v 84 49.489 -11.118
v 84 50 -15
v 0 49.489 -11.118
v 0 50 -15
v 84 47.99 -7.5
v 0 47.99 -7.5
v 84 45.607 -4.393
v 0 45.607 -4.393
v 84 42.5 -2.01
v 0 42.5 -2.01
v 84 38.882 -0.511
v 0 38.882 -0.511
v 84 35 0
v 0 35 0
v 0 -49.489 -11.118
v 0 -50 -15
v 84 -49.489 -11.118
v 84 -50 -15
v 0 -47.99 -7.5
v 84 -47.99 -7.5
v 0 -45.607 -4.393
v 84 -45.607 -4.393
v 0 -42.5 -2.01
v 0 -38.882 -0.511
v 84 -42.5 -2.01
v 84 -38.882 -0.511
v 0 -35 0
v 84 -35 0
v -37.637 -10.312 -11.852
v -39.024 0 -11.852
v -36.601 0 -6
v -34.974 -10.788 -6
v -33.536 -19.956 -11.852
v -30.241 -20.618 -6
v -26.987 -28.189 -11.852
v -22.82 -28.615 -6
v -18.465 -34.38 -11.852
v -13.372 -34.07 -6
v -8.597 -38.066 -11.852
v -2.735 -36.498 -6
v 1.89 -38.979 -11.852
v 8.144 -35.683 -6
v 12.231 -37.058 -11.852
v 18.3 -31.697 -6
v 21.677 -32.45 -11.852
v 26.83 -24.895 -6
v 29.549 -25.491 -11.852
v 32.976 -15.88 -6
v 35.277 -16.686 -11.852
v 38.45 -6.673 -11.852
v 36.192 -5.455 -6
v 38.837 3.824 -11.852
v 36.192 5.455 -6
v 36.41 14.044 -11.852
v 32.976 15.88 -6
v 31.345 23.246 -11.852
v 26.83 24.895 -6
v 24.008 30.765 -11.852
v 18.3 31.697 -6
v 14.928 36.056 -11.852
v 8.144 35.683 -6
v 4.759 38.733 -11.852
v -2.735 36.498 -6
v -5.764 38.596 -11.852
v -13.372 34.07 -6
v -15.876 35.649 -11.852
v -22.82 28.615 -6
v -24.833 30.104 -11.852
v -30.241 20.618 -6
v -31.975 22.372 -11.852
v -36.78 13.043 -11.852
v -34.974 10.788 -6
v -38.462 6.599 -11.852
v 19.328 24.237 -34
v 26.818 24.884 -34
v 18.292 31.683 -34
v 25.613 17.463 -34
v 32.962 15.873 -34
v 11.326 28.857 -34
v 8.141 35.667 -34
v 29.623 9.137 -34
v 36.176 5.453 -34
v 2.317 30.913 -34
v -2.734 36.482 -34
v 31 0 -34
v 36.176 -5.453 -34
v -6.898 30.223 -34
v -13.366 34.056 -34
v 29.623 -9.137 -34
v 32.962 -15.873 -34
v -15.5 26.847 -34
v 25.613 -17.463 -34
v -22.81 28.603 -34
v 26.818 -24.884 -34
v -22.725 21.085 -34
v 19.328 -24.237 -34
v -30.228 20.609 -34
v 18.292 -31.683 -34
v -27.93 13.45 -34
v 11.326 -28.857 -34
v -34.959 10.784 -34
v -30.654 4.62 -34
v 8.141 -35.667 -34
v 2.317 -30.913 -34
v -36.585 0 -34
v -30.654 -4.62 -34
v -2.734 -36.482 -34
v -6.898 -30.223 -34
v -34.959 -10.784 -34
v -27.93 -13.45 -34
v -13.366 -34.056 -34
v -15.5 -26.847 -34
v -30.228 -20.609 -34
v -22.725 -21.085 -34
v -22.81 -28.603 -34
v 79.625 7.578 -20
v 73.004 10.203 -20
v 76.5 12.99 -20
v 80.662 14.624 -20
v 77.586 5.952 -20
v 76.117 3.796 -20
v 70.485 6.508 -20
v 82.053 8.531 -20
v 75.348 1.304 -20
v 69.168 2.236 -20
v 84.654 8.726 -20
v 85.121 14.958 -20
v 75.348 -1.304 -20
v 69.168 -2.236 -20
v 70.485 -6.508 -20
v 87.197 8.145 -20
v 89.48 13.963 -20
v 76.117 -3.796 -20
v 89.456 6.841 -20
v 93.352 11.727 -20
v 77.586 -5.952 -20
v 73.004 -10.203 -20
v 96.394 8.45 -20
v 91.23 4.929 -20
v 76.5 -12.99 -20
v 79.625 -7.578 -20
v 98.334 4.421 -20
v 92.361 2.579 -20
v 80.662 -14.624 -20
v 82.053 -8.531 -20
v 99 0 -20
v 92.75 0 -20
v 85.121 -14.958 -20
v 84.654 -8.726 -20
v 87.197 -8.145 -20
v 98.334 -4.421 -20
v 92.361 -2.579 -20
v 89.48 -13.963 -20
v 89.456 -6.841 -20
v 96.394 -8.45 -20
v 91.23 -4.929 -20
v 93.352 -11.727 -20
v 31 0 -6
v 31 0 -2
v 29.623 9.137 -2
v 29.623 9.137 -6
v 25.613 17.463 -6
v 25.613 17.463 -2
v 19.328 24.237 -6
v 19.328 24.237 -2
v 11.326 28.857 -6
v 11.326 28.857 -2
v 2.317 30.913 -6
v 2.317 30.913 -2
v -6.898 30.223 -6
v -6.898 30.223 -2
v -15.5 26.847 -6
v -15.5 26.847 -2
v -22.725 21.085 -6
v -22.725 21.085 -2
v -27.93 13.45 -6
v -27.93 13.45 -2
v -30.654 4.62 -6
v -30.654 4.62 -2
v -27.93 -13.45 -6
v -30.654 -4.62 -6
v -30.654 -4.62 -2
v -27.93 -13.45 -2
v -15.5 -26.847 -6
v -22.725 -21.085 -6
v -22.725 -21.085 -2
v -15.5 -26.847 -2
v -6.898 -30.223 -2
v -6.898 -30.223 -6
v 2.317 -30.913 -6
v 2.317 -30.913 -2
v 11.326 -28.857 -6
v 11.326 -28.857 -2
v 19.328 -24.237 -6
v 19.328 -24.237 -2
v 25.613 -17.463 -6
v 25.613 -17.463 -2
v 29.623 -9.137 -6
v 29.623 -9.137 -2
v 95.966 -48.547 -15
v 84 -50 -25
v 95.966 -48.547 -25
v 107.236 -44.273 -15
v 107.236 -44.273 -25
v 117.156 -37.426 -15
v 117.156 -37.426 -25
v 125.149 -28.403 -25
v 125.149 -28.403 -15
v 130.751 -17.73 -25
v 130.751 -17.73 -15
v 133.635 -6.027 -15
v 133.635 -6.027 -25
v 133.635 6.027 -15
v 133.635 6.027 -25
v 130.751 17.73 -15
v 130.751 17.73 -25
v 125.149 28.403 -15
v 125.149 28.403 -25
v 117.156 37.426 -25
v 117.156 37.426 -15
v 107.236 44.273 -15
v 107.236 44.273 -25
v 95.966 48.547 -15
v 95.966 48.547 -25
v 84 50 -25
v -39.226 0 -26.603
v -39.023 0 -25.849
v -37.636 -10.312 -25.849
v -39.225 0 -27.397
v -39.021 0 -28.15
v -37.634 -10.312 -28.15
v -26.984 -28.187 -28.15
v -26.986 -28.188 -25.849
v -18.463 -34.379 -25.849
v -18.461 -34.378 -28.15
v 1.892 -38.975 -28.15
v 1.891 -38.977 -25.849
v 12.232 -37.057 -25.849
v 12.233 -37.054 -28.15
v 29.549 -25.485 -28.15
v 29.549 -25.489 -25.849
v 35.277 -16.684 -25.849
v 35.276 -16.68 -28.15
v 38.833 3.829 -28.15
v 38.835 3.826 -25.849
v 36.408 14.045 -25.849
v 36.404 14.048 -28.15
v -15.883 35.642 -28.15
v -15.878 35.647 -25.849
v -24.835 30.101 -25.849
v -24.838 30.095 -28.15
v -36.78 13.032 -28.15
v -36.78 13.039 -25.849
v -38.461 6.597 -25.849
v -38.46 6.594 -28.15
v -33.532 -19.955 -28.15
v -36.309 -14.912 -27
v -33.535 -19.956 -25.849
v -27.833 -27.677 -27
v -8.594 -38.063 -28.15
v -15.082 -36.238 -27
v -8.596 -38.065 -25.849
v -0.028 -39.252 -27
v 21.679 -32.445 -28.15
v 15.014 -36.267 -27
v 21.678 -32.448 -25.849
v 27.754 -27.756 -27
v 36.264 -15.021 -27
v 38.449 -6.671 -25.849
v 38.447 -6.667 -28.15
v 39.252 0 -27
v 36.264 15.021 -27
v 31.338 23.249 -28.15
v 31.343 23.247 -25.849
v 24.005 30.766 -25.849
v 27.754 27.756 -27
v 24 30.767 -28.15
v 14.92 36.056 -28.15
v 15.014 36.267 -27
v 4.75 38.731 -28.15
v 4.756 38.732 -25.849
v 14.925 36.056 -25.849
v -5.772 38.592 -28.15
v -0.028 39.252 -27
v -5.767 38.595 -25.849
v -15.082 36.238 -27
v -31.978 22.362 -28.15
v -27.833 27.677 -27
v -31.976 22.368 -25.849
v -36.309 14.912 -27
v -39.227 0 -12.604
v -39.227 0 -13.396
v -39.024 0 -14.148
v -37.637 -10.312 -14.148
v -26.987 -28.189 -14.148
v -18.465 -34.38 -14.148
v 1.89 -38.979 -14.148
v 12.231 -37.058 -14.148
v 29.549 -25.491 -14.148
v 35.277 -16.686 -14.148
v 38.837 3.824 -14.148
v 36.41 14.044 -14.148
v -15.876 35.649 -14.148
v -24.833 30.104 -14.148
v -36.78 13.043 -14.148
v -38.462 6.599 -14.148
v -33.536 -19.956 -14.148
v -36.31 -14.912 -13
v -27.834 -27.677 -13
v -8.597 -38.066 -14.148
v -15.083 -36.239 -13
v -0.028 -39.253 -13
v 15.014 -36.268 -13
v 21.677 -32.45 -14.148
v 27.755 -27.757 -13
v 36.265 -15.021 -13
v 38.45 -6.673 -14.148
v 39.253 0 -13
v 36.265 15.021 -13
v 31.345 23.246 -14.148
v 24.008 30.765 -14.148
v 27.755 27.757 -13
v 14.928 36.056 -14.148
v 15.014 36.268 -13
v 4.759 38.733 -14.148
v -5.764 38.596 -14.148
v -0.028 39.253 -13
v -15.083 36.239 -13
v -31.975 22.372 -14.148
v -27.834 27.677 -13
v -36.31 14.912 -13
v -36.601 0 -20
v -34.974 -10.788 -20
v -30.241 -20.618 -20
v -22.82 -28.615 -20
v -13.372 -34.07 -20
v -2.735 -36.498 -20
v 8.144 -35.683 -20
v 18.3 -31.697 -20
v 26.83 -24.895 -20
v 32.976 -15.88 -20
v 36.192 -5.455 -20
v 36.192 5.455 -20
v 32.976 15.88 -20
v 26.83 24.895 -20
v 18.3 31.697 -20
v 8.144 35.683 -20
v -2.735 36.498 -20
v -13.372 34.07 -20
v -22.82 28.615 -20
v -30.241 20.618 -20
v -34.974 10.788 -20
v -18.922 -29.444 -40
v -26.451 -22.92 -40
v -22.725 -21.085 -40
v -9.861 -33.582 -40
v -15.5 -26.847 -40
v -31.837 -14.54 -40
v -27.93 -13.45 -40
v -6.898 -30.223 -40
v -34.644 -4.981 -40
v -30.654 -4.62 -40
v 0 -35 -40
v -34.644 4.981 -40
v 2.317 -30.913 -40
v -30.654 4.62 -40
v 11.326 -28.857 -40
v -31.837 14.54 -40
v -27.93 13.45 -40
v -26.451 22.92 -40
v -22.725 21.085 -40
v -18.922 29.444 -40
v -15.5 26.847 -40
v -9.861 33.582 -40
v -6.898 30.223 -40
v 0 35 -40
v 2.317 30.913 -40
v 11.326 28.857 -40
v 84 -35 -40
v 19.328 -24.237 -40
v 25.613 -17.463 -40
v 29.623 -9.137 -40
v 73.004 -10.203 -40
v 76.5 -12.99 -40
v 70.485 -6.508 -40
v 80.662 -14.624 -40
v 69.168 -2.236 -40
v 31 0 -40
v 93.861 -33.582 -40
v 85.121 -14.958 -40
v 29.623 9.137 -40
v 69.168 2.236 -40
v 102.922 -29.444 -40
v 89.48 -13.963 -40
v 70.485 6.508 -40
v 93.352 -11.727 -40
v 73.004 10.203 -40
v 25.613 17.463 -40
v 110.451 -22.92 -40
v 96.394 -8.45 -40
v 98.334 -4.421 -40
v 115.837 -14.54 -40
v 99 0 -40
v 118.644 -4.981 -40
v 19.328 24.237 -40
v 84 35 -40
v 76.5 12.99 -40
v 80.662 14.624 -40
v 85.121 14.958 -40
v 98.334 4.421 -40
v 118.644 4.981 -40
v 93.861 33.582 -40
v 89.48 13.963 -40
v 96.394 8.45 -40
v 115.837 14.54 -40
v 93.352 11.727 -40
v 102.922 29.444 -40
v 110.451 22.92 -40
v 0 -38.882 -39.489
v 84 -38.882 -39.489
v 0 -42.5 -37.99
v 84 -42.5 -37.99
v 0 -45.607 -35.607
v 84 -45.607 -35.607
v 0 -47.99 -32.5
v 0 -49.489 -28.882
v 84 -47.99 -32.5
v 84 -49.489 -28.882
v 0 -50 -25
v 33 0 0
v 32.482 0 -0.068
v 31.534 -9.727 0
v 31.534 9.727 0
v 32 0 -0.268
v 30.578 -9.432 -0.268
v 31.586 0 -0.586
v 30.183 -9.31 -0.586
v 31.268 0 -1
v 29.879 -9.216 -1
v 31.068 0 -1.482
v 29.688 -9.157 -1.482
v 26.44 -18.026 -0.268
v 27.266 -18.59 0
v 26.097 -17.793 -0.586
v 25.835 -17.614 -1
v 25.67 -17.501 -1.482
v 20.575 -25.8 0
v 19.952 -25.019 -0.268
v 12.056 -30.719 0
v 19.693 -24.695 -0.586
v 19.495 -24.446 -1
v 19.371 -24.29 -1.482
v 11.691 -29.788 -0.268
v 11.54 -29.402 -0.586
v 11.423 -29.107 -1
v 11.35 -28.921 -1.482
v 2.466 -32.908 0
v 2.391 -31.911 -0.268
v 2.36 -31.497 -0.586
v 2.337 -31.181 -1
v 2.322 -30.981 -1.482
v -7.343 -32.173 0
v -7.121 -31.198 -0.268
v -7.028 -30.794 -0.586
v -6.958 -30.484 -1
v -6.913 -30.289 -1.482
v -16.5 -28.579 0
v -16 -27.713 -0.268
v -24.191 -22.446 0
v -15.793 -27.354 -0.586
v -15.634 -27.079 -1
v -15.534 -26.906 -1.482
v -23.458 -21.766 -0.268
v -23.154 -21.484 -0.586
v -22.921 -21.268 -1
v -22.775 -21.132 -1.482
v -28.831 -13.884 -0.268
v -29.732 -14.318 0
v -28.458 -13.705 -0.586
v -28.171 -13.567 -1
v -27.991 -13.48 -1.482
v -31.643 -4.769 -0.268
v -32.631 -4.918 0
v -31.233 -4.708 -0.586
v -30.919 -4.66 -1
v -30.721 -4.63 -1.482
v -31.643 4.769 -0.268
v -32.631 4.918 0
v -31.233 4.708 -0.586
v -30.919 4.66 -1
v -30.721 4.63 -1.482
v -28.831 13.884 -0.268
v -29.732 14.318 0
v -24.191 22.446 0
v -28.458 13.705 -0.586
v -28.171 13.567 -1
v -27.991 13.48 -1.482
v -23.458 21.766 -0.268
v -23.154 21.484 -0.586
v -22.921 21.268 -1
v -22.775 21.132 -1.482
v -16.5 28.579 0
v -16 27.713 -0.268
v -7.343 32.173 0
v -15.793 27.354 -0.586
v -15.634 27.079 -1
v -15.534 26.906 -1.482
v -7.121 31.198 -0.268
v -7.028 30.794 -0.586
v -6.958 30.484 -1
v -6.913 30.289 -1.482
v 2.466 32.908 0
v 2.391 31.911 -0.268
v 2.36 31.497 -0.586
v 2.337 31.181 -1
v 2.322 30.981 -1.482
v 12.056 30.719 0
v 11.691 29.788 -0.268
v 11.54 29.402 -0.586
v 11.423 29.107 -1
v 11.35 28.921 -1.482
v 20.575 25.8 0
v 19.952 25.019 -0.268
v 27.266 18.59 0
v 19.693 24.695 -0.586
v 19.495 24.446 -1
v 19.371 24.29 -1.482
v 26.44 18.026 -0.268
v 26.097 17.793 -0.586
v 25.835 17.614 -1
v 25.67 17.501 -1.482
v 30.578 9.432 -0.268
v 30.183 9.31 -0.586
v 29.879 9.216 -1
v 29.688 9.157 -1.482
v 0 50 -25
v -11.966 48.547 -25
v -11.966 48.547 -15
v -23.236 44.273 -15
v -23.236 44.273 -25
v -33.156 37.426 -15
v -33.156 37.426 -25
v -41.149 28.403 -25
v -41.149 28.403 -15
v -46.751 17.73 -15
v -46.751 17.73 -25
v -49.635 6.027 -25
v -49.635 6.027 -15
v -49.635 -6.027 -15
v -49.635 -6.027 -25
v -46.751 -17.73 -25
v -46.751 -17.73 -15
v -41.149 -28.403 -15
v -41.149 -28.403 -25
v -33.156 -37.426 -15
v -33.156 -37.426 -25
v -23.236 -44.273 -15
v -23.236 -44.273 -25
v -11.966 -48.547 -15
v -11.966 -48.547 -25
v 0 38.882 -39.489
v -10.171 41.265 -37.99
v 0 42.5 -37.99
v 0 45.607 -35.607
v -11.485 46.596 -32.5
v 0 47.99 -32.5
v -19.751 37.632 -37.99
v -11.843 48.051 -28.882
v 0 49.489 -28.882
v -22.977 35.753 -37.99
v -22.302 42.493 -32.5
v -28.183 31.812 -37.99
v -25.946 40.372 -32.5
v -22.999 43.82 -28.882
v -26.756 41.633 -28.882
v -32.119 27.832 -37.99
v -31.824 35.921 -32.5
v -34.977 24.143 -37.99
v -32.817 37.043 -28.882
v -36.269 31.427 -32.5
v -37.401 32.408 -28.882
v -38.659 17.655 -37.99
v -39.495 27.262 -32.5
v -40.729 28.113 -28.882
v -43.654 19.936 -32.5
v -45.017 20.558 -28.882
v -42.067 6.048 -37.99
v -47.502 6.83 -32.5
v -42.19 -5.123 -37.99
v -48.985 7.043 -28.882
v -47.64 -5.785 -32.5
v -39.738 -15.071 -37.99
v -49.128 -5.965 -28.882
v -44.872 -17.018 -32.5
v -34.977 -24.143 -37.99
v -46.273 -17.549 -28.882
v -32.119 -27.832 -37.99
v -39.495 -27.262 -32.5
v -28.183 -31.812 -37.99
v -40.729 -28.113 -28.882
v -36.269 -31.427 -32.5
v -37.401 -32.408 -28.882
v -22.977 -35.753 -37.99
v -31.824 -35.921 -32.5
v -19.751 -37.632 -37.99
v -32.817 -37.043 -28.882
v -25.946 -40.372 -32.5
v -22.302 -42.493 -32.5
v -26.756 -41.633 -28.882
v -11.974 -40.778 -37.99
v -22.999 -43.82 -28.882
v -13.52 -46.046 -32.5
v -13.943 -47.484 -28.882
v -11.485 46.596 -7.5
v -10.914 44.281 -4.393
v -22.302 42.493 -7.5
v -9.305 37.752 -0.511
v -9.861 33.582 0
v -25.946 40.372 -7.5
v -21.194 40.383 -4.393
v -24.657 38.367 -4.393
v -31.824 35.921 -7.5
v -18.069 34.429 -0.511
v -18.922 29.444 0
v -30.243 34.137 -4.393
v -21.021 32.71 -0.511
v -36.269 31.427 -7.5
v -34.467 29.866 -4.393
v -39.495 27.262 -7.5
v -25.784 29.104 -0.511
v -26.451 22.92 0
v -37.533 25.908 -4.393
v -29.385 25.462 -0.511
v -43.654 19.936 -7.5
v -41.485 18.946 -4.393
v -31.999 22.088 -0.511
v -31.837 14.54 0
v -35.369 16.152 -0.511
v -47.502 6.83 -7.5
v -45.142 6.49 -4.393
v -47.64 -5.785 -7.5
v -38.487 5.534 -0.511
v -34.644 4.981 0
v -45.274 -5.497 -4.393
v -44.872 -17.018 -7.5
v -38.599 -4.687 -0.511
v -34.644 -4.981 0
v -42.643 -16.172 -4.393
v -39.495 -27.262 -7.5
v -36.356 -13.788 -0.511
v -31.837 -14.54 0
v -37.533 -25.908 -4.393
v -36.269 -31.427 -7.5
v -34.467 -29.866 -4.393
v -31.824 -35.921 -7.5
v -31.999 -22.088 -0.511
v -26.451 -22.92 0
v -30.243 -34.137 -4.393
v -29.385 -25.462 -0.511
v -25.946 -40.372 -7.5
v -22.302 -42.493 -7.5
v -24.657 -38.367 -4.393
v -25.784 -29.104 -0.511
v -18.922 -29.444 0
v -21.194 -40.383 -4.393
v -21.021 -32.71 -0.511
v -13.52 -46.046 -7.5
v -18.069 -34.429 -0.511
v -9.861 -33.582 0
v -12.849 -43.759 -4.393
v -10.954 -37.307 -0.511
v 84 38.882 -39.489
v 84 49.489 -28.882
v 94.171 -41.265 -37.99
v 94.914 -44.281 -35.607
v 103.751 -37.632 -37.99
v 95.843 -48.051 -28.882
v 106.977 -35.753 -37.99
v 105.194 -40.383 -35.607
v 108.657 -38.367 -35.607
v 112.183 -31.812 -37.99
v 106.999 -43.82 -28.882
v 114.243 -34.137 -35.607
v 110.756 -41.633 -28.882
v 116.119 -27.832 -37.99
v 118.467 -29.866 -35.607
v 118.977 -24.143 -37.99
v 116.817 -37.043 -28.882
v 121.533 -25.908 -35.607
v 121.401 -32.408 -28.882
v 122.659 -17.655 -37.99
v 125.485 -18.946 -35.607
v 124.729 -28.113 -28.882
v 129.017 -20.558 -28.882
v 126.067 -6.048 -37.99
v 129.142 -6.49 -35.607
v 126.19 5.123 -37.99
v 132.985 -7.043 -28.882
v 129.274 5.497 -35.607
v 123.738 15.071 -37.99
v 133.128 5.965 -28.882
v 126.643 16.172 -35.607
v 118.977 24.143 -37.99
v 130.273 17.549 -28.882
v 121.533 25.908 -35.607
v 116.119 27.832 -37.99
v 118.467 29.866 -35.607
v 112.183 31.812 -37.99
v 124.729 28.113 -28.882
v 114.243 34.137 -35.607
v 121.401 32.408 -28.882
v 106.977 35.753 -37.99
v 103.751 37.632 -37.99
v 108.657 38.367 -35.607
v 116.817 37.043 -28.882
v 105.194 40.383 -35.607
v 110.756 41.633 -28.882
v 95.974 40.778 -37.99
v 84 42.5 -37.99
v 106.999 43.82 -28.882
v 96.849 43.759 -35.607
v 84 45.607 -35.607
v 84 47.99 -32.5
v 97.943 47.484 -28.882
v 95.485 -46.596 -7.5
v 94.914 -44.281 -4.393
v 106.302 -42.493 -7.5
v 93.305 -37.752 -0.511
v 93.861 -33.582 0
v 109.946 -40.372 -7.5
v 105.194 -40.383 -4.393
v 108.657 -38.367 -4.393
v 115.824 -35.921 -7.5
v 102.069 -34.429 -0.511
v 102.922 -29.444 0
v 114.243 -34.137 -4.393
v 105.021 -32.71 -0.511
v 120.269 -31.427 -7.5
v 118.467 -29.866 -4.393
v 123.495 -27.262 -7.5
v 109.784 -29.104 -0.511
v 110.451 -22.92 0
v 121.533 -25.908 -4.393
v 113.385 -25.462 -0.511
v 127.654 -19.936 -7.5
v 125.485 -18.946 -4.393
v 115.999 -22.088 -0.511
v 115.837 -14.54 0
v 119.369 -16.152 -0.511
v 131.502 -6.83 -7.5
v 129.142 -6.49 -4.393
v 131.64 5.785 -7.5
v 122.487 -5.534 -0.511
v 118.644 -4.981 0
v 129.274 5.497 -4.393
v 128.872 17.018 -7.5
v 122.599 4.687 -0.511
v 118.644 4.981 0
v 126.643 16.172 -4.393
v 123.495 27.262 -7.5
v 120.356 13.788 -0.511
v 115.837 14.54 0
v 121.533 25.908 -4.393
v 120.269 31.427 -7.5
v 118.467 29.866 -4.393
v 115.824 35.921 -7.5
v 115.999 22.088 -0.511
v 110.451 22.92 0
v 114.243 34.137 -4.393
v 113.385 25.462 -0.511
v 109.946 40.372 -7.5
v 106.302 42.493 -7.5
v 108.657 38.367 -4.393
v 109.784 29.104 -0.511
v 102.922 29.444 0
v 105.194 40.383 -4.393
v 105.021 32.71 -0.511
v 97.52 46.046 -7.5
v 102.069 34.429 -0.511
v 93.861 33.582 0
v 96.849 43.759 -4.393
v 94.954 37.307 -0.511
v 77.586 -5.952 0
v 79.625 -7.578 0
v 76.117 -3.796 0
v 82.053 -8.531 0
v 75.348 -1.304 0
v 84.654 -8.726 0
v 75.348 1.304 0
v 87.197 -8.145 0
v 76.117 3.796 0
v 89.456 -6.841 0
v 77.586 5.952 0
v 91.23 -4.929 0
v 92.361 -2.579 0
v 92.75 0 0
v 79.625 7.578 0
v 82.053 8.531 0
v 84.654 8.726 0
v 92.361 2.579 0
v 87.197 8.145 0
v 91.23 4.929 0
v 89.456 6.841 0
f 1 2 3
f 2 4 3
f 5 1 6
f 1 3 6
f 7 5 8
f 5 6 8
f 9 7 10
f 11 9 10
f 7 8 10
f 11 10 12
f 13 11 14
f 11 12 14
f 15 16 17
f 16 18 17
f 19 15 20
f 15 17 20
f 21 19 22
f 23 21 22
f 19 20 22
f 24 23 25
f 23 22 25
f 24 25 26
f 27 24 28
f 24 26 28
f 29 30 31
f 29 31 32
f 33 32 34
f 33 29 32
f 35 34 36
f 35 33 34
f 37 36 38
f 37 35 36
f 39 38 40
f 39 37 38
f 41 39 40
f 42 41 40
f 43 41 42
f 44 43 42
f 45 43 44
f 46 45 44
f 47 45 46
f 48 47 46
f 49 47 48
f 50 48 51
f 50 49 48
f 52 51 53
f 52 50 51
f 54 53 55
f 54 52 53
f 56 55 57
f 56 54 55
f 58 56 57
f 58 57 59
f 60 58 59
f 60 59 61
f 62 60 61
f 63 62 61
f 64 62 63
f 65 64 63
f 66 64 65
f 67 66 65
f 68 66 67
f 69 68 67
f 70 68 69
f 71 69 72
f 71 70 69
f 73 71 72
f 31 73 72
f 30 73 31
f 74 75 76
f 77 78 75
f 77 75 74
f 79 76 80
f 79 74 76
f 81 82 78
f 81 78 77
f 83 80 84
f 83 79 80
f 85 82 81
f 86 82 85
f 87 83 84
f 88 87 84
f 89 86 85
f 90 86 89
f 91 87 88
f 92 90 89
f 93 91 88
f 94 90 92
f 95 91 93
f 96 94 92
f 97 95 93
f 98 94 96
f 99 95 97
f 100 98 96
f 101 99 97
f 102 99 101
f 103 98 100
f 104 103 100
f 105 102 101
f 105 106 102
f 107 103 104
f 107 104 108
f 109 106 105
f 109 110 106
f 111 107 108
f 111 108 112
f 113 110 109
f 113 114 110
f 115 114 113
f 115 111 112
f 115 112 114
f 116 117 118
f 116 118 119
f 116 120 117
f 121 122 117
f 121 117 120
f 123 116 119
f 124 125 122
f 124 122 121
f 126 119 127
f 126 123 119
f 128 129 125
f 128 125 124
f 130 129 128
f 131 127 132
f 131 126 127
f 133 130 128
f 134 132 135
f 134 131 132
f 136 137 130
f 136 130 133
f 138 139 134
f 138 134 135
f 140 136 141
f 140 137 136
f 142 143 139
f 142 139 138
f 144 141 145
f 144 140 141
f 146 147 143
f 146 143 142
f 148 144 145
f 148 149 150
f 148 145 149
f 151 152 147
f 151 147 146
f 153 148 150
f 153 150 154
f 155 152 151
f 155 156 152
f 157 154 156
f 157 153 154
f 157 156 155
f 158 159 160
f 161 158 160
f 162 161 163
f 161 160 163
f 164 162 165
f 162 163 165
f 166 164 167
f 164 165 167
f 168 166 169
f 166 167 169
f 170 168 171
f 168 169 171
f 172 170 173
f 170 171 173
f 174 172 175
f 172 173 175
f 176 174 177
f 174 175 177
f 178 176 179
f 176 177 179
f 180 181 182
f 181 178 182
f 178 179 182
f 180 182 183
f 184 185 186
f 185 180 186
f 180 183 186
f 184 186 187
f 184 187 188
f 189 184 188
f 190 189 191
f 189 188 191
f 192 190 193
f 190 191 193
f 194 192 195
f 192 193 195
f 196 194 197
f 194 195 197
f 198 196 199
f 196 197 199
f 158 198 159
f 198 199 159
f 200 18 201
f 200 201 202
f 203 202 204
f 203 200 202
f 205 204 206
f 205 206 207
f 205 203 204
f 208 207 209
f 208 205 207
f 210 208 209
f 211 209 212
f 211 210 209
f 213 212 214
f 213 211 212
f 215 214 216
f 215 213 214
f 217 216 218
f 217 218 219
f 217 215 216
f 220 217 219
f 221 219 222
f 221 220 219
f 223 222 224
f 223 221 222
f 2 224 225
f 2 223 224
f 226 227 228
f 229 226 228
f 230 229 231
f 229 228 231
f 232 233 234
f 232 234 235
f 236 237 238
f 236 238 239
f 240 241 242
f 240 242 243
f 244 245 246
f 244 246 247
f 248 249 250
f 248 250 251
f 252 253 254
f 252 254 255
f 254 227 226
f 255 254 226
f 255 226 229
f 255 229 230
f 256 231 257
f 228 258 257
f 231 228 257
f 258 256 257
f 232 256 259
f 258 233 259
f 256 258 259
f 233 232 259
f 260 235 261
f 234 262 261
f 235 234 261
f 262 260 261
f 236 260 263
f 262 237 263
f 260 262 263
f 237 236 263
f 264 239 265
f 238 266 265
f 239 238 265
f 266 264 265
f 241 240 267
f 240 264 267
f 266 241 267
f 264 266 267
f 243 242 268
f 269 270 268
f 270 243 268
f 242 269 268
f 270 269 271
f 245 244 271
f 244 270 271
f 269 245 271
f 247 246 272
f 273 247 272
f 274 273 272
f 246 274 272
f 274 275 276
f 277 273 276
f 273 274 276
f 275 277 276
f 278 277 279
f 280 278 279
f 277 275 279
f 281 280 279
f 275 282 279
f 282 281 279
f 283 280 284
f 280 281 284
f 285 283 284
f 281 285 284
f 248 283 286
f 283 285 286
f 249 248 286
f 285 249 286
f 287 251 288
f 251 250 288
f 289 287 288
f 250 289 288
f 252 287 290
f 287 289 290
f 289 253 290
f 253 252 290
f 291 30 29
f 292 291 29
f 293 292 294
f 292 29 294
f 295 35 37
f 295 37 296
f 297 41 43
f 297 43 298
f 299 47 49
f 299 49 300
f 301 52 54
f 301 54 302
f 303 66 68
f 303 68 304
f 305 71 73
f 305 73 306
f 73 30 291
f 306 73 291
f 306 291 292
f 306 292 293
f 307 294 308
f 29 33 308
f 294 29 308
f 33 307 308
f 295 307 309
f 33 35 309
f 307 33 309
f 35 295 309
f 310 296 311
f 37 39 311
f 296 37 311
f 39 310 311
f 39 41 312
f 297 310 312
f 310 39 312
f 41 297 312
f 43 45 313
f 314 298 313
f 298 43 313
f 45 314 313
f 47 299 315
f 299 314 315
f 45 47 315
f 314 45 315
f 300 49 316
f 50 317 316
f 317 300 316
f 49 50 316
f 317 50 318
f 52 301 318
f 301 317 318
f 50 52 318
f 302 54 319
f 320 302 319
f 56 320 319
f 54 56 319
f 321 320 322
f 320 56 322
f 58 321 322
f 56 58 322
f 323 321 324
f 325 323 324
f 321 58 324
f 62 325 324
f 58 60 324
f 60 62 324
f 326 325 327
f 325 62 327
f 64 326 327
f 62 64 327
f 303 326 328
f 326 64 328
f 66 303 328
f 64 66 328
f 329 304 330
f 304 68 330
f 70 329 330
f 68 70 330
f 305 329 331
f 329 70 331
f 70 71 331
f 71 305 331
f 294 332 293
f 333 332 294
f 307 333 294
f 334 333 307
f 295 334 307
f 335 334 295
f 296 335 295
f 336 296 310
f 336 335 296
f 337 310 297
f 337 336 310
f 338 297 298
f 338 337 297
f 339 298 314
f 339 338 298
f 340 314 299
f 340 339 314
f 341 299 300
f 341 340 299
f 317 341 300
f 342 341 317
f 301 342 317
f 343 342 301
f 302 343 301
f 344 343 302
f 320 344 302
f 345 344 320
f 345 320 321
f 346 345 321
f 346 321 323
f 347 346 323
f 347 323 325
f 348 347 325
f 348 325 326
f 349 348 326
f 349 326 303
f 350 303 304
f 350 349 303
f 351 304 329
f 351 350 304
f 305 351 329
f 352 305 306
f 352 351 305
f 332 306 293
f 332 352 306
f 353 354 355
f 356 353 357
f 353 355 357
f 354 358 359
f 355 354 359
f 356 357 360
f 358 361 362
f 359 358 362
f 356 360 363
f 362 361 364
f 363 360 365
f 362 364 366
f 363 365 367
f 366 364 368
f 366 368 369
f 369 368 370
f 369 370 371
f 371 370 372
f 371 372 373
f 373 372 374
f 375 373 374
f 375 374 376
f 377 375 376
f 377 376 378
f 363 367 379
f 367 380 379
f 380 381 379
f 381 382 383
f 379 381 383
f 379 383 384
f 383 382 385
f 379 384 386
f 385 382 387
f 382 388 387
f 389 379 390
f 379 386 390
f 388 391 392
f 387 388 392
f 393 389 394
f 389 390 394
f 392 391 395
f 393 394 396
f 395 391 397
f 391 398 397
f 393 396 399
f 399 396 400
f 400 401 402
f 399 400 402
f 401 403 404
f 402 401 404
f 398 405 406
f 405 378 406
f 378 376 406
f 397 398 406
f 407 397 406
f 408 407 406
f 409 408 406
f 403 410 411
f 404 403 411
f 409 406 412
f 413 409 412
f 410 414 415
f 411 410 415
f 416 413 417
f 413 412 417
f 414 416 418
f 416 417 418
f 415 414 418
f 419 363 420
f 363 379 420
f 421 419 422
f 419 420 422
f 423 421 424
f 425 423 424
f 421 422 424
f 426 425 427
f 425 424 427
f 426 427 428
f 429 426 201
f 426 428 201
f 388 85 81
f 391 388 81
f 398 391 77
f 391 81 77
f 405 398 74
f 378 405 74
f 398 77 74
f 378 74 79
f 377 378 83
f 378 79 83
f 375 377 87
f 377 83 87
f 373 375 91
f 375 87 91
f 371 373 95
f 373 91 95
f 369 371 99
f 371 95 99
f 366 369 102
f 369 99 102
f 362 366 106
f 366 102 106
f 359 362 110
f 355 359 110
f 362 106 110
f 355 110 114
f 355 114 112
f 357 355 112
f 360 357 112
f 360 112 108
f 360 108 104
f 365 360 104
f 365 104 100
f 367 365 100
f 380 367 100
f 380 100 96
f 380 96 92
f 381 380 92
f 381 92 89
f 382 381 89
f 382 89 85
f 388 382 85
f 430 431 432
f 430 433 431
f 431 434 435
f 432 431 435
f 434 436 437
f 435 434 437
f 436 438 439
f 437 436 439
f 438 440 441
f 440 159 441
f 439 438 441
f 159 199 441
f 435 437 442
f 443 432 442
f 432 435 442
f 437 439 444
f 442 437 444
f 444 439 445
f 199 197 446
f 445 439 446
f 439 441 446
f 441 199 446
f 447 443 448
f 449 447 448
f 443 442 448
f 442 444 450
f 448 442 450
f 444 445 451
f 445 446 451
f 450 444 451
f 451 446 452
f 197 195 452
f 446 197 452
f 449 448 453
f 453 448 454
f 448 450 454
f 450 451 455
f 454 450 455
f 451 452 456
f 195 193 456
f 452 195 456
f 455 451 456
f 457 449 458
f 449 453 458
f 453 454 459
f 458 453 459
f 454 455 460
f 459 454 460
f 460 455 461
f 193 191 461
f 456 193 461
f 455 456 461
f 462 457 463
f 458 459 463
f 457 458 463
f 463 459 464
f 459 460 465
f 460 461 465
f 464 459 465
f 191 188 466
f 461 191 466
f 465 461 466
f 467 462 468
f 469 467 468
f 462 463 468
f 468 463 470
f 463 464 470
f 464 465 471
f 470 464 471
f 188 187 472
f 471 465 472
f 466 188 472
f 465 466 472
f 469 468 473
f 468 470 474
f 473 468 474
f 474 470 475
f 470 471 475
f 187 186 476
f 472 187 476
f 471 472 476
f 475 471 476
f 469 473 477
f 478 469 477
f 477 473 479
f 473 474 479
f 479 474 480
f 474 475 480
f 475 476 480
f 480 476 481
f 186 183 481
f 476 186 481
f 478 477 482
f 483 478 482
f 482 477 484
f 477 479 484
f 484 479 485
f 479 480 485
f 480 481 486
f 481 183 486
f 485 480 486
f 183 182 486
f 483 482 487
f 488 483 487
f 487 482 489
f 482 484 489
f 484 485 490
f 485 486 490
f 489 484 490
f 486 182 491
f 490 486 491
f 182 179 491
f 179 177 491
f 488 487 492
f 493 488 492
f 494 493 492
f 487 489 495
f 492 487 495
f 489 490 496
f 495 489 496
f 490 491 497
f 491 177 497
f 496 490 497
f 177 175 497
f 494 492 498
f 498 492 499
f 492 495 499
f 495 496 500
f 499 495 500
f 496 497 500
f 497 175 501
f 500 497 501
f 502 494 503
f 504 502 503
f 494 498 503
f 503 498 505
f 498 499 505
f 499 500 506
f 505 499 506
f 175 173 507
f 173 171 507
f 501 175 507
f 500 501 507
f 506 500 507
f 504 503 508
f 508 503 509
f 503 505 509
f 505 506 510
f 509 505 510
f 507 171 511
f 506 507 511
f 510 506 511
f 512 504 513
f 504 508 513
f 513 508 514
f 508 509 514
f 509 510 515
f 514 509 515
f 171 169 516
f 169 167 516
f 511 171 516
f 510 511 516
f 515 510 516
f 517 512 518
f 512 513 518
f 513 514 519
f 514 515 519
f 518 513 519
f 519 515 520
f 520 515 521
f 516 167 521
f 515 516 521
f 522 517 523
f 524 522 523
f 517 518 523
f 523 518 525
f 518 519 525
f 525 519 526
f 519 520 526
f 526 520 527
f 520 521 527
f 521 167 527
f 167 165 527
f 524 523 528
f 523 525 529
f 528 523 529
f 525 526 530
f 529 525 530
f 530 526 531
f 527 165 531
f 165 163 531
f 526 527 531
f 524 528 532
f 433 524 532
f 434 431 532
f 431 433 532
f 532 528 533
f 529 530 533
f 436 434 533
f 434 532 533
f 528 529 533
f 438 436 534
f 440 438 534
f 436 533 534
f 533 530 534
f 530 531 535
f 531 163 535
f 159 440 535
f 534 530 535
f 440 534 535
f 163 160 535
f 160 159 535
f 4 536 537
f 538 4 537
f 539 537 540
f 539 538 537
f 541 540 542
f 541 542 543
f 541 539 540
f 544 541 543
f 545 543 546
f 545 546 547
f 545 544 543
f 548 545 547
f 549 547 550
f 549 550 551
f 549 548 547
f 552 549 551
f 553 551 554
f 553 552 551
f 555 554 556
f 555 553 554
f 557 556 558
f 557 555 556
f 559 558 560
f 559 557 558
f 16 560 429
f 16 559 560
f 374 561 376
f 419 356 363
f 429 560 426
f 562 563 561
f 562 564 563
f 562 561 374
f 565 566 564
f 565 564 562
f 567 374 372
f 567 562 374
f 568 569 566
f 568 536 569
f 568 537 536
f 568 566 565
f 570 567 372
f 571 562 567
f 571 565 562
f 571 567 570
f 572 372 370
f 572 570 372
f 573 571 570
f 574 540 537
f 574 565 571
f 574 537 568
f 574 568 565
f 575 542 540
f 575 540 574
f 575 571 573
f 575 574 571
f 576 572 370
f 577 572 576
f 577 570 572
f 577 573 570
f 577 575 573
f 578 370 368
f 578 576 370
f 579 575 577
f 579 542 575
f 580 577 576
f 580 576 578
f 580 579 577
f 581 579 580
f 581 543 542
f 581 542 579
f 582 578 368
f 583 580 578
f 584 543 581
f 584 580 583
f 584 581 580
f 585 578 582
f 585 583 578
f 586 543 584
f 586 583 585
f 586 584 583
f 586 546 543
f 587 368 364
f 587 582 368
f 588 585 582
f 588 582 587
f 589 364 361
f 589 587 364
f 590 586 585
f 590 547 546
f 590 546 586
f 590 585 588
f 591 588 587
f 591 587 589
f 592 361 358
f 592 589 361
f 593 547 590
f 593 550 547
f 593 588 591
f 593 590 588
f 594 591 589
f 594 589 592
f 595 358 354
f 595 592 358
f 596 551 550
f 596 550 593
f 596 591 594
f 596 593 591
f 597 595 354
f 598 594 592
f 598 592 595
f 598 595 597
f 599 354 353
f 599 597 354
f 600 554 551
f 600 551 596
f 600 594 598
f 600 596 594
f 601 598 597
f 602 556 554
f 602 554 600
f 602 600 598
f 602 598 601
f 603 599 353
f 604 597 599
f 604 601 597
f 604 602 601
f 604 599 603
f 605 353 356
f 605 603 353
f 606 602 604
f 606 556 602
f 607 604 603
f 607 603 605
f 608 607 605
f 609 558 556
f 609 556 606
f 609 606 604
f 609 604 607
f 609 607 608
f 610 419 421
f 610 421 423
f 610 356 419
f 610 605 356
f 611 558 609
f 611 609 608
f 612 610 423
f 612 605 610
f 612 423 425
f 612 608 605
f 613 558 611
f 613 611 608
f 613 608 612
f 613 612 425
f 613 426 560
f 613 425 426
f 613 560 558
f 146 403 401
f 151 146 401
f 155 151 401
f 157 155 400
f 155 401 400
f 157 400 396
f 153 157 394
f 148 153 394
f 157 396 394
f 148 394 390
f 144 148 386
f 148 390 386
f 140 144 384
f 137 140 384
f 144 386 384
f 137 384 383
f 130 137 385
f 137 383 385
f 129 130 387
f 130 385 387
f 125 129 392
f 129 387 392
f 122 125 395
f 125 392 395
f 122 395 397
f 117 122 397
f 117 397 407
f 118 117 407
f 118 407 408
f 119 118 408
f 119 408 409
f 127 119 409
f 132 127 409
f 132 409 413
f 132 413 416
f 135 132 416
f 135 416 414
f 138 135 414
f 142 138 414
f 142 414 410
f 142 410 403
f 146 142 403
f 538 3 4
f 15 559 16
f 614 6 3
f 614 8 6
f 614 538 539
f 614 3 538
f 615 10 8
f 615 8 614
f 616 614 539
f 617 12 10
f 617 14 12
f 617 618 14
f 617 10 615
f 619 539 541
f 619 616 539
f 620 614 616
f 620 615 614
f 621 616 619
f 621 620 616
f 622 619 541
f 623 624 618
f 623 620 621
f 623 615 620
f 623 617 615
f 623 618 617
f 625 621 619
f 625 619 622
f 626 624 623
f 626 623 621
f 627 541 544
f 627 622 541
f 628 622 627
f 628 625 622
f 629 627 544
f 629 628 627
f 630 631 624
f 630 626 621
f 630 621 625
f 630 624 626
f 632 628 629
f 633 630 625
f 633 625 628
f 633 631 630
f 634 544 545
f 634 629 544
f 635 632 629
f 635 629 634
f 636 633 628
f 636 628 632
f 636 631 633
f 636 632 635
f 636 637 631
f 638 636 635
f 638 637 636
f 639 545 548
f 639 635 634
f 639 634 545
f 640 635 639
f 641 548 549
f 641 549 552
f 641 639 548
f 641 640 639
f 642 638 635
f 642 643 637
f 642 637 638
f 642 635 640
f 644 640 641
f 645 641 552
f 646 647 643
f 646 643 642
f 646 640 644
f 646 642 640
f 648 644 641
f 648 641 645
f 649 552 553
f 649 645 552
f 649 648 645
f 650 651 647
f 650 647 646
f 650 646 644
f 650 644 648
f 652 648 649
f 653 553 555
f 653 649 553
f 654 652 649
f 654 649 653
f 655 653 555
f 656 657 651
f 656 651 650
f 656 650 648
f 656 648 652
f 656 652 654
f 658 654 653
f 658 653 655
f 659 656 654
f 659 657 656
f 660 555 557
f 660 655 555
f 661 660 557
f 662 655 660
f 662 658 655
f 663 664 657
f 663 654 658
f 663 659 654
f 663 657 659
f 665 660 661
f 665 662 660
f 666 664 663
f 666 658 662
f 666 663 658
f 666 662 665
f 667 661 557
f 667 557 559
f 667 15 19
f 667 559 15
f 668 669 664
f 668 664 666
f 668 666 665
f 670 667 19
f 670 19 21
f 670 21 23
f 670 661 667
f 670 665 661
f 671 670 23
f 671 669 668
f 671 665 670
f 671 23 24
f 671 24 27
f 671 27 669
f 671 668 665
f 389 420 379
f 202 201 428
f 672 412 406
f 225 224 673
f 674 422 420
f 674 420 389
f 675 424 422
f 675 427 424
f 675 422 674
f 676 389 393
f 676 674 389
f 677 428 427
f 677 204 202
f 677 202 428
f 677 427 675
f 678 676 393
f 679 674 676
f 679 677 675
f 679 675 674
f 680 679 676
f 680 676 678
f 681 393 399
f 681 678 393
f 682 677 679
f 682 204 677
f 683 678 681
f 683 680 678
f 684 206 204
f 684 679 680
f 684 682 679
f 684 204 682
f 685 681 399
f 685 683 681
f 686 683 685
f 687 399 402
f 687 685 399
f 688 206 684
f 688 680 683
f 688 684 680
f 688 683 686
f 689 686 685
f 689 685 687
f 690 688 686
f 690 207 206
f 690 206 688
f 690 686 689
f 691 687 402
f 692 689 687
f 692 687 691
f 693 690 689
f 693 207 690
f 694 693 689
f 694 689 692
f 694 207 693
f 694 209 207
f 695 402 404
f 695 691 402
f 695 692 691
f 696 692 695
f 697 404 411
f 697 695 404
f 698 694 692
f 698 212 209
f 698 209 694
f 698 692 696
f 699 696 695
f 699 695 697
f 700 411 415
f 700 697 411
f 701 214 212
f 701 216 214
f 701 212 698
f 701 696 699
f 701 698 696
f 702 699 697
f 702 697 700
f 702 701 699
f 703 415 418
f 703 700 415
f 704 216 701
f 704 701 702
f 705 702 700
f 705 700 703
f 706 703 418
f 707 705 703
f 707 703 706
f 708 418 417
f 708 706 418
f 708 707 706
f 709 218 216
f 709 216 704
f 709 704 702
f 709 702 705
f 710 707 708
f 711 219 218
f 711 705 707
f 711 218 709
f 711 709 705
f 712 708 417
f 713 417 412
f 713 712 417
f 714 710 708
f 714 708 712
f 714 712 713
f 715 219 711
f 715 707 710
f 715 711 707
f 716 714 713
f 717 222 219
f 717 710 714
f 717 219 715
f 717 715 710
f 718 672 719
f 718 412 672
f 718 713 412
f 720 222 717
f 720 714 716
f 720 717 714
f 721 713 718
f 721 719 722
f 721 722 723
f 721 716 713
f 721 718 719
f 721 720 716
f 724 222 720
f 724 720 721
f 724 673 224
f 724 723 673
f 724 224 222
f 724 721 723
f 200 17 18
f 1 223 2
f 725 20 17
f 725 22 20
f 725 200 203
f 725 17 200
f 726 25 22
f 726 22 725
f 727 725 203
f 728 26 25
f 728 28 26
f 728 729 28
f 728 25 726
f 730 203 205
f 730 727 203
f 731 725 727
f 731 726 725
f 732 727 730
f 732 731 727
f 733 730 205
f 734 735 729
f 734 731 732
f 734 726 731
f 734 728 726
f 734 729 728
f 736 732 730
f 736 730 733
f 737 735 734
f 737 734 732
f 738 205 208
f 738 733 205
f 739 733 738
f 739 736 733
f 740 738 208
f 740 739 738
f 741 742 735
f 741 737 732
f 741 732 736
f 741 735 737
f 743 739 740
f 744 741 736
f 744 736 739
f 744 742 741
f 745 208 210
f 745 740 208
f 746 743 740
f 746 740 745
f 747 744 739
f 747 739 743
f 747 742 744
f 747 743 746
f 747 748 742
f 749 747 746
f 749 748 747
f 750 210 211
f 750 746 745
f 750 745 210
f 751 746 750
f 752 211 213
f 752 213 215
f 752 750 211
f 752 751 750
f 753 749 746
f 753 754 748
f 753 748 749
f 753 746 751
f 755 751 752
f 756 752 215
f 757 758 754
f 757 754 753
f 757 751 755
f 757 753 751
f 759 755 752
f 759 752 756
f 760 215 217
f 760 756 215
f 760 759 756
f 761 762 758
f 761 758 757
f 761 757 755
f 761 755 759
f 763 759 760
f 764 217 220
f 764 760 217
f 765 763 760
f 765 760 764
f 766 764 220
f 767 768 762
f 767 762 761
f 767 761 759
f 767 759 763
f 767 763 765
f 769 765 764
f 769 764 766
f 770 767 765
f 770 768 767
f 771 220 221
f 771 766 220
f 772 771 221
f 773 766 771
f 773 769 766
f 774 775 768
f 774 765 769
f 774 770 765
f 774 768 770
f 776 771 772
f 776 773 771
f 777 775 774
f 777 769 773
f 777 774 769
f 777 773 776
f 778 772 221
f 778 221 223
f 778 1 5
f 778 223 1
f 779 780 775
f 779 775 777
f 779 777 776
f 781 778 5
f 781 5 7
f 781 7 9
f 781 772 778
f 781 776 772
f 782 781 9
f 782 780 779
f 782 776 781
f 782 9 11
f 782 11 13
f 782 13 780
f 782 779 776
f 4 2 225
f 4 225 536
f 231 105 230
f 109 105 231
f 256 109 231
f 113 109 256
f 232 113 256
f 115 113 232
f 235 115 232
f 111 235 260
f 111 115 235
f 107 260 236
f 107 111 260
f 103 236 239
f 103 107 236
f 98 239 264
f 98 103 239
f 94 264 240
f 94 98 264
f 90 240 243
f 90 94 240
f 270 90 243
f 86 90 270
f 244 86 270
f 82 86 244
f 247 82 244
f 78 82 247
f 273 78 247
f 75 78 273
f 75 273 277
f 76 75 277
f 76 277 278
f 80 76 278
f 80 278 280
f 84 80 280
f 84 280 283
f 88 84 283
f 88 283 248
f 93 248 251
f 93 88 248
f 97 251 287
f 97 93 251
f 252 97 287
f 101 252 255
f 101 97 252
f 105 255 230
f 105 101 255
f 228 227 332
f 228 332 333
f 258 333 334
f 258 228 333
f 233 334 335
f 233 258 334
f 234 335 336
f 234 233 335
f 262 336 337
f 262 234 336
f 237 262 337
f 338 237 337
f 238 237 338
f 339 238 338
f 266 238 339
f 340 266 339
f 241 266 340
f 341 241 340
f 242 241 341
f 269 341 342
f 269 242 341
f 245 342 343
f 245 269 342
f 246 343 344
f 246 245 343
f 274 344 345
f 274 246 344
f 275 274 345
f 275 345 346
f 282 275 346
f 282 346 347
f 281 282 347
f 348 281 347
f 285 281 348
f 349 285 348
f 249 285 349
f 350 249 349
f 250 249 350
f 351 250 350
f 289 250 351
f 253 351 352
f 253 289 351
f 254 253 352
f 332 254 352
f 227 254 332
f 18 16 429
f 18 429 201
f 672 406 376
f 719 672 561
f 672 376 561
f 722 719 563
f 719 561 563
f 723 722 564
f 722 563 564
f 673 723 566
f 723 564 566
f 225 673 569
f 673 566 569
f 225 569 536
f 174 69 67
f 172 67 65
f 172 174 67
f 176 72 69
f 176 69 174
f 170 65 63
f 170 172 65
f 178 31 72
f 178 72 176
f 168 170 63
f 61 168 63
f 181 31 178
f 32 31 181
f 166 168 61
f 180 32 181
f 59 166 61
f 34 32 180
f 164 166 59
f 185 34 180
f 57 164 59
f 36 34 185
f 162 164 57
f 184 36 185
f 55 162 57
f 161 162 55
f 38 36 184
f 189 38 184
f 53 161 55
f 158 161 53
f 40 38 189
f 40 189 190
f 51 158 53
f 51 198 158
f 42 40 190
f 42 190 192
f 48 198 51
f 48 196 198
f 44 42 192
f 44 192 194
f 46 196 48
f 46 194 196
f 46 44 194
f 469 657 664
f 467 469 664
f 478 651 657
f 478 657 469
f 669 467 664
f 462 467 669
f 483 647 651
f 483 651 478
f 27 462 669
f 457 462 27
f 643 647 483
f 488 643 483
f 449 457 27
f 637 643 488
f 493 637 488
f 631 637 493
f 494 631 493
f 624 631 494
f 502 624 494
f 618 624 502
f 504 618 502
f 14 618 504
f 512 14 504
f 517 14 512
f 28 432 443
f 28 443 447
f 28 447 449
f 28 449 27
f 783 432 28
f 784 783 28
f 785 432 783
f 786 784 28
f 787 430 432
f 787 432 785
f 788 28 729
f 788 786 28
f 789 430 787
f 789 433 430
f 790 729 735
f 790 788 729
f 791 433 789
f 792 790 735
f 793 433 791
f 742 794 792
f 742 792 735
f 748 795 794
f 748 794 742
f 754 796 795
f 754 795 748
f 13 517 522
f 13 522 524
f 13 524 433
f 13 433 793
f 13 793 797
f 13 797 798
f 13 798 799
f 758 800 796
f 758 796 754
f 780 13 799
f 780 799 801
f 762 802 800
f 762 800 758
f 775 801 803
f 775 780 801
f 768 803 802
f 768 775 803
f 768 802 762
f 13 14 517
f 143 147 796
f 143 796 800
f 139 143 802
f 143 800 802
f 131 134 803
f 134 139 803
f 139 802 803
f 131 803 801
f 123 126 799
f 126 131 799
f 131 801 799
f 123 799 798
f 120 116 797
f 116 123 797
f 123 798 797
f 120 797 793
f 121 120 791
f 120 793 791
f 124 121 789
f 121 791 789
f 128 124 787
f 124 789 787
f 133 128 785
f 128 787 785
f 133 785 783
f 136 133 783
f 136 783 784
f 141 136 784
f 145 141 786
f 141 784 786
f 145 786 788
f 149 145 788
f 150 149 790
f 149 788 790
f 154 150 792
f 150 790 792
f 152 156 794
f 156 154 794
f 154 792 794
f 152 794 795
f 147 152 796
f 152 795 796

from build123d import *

# Parameters (mm, degrees)
F0_R           = 31
F0_R_2         = 8.75
F2_DEPTH       = 40
F4_D           = 17.5
F4_DEPTH       = 50
F4_CBORE_D     = 30
F4_CBORE_DEPTH = 20
F6_R           = 3
F8_R           = 15
F9_R           = 2


with BuildPart() as f2:
    # F0 (on Top) → F2 (new body)
    with BuildSketch(Plane.XY):
        with BuildLine():
            Line((84, 50), (0, 50))
            ThreePointArc((0, 50), (-50, 0), (0, -50))
            Line((0, -50), (84, -50))
            ThreePointArc((84, -50), (134, 0), (84, 50))
        make_face()
        Circle(F0_R, mode=Mode.SUBTRACT)
        with Locations((84, 0)):
            Circle(F0_R_2, mode=Mode.SUBTRACT)
    extrude(amount=-F2_DEPTH)

    # F4
    with Locations(Plane(origin=(0, 0, -40), x_dir=(1, 0, 0), z_dir=(0, 0, -1))):
        with Locations((84, 0)):
            CounterBoreHole(F4_D / 2, F4_CBORE_D / 2, F4_CBORE_DEPTH, depth=F4_DEPTH)


with BuildPart() as f5:
    # F1 (on Front) → F5 (revolve)
    with BuildSketch(Plane.XZ):
        Polygon((0, 0), (-31, 0), (-31, -6), (-36.600505, -6), (-39.5, -13), (-36.600505, -20), (-39.5, -27), (-36.58464, -33.999979), (-31, -33.999979), (-31, -40), (0, -40), align=None)
    revolve(axis=Axis((0, 0, -20), (0, 0, 1)))

    # F6
    f6_edges = [f5.edges().sort_by_distance(p)[0] for p in [
        (39.5, 0, -27),
        (39.5, 0, -13),
    ]]
    fillet(f6_edges, radius=F6_R)


with BuildPart() as f2_1:
    add(f2.part)

    # F7: cut F5
    add(f5.part, mode=Mode.SUBTRACT)

    # F8
    f8_edges = [f2_1.edges().sort_by_distance(p)[0] for p in [
        (42, -50, 0),
        (42, -50, -40),
    ]]
    fillet(f8_edges, radius=F8_R)

    # F9
    f9_edges = [f2_1.edges().sort_by_distance(p)[0] for p in [
        (-31, 0, 0),
    ]]
    fillet(f9_edges, radius=F9_R)


solid = f2_1.part
